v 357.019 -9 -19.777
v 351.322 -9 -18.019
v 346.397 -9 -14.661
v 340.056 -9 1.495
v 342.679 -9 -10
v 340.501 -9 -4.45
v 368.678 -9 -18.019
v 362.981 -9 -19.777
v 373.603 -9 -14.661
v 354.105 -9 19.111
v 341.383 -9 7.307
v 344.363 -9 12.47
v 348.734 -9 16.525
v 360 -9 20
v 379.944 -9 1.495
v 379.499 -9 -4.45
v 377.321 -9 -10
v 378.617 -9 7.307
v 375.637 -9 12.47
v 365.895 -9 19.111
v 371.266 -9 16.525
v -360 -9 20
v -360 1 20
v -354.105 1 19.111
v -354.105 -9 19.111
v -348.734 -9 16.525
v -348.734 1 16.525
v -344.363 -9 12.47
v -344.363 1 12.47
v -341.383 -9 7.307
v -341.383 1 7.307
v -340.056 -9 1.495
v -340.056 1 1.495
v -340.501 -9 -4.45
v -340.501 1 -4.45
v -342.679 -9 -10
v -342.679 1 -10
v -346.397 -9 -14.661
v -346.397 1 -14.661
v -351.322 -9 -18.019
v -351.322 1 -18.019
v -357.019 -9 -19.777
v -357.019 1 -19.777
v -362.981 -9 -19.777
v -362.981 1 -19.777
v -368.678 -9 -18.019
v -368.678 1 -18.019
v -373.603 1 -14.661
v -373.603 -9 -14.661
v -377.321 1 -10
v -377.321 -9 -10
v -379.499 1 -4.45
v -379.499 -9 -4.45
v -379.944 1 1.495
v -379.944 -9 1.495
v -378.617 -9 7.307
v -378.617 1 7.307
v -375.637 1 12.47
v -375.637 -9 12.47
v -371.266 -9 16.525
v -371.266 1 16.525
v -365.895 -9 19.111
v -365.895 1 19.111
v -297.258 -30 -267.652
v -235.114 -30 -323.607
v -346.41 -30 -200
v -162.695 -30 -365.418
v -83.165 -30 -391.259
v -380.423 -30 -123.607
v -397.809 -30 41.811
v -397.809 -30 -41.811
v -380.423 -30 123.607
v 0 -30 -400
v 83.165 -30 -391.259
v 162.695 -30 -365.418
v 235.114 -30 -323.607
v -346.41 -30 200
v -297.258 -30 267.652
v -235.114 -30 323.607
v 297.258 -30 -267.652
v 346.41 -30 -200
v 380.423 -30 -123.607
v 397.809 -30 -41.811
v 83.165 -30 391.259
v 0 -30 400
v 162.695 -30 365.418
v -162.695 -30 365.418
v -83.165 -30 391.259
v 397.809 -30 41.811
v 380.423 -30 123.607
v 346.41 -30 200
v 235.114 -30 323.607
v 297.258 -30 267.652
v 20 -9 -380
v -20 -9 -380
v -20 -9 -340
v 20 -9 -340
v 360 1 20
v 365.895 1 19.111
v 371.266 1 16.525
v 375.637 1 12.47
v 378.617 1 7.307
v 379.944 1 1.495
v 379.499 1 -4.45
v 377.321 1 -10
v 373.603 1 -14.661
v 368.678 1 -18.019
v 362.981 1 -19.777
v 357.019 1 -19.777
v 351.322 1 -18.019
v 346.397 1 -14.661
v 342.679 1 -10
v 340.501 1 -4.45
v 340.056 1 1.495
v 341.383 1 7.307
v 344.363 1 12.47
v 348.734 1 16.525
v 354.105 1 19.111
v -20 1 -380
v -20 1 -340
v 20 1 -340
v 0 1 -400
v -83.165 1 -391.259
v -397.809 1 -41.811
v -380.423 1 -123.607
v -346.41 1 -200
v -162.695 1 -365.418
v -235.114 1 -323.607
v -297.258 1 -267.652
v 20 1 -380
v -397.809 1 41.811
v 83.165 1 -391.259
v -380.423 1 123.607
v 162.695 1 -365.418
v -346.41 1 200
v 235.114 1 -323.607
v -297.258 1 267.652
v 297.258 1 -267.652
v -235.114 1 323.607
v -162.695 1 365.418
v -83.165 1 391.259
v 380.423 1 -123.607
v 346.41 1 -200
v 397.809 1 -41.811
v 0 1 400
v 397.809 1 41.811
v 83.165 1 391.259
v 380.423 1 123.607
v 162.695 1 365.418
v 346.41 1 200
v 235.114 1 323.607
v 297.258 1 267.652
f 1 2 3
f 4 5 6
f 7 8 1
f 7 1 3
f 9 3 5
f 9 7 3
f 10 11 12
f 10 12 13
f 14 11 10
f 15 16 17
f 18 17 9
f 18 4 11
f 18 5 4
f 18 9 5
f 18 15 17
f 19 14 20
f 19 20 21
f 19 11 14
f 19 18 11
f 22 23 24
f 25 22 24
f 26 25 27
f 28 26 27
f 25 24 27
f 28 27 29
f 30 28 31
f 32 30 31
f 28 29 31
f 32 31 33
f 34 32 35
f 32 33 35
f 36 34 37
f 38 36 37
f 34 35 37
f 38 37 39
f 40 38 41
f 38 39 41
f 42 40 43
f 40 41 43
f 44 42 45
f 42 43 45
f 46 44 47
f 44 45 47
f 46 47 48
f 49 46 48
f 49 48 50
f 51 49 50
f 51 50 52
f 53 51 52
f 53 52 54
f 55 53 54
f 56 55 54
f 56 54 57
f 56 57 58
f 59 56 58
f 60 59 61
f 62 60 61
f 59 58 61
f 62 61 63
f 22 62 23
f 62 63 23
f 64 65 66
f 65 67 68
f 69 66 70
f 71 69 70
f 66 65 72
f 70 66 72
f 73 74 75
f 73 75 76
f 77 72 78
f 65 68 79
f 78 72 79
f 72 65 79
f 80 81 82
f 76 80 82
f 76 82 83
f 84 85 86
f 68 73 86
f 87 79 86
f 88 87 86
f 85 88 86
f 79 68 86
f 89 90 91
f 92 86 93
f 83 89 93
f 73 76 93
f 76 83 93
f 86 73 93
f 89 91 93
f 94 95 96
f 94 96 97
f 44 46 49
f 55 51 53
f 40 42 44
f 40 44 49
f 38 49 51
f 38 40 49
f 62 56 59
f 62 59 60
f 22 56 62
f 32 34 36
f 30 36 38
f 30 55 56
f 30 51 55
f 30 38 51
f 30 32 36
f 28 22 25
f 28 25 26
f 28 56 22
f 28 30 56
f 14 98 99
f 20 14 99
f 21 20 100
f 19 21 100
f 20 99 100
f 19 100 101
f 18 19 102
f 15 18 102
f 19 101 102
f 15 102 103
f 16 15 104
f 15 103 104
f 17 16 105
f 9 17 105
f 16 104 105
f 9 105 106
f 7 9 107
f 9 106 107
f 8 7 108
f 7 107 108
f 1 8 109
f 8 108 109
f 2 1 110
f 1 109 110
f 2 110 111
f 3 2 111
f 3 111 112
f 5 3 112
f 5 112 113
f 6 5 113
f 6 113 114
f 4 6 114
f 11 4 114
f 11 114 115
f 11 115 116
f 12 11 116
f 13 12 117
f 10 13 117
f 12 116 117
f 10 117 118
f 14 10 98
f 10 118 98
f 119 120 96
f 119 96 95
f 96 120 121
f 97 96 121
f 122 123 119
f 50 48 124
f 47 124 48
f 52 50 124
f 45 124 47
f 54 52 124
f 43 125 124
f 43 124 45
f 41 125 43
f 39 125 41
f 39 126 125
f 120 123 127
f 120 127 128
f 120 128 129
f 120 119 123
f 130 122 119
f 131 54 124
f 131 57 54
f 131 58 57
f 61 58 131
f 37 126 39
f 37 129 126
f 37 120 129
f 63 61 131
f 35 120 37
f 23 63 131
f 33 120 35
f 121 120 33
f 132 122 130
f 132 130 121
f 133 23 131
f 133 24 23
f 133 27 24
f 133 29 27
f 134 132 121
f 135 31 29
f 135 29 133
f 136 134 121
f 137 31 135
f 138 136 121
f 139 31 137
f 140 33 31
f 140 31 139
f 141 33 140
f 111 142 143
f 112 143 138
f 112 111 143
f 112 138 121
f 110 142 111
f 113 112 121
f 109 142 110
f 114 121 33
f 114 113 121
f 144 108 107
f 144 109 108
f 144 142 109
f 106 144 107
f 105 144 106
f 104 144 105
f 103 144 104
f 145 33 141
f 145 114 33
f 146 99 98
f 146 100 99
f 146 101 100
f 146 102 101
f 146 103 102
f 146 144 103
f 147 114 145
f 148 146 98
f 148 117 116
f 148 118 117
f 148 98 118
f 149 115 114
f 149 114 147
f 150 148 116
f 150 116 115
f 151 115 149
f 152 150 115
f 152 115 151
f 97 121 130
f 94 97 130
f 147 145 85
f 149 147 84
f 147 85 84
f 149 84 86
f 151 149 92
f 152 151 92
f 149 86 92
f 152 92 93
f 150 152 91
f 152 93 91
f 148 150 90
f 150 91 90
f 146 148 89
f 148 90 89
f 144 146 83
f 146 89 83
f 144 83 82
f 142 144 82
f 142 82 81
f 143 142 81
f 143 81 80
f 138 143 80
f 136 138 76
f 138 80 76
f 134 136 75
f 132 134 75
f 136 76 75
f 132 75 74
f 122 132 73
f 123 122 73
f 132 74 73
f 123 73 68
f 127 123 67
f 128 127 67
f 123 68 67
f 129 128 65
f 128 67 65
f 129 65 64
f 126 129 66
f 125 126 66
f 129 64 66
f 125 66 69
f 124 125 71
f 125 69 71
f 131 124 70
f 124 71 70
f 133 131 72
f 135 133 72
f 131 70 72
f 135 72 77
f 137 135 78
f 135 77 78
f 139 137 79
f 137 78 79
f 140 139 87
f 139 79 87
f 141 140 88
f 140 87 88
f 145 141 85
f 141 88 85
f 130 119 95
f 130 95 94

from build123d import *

# Parameters (mm, degrees)
BOSS_EXTRUDE1_DEPTH      = 1
BOSS_EXTRUDE1_DEPTH_BACK = 30
SKETCH1_R                = 400
SKETCH2_R                = 20
SKETCH2_W                = 40
SKETCH2_H                = 40
CUT_EXTRUDE1_DEPTH       = 10


with BuildPart() as part:
    # Sketch1 → Boss-Extrude1 (new, two sides: drawn at the far end of the back side and taken through both)
    with BuildSketch(Plane(origin=(0, 0, 0), x_dir=(1, 0, 0), z_dir=(0, 1, 0)).offset(-BOSS_EXTRUDE1_DEPTH_BACK)):
        with Locations(Location((0, 0, 0), (0, 0, 270))):
            Circle(SKETCH1_R)
    extrude(amount=BOSS_EXTRUDE1_DEPTH + BOSS_EXTRUDE1_DEPTH_BACK)

    # Sketch2 → Cut-Extrude1 (cut)
    with BuildSketch(Plane(origin=(0, 1, 0), x_dir=(1, 0, 0), z_dir=(0, 1, 0))):
        with Locations(Location((-360, 0, 0), (0, 0, 270))):
            Circle(SKETCH2_R)
        with Locations(Location((360, 0, 0), (0, 0, 270))):
            Circle(SKETCH2_R)
        with Locations((0, 360)):
            Rectangle(SKETCH2_W, SKETCH2_H)
    extrude(amount=-CUT_EXTRUDE1_DEPTH, mode=Mode.SUBTRACT)


solid = part.part
